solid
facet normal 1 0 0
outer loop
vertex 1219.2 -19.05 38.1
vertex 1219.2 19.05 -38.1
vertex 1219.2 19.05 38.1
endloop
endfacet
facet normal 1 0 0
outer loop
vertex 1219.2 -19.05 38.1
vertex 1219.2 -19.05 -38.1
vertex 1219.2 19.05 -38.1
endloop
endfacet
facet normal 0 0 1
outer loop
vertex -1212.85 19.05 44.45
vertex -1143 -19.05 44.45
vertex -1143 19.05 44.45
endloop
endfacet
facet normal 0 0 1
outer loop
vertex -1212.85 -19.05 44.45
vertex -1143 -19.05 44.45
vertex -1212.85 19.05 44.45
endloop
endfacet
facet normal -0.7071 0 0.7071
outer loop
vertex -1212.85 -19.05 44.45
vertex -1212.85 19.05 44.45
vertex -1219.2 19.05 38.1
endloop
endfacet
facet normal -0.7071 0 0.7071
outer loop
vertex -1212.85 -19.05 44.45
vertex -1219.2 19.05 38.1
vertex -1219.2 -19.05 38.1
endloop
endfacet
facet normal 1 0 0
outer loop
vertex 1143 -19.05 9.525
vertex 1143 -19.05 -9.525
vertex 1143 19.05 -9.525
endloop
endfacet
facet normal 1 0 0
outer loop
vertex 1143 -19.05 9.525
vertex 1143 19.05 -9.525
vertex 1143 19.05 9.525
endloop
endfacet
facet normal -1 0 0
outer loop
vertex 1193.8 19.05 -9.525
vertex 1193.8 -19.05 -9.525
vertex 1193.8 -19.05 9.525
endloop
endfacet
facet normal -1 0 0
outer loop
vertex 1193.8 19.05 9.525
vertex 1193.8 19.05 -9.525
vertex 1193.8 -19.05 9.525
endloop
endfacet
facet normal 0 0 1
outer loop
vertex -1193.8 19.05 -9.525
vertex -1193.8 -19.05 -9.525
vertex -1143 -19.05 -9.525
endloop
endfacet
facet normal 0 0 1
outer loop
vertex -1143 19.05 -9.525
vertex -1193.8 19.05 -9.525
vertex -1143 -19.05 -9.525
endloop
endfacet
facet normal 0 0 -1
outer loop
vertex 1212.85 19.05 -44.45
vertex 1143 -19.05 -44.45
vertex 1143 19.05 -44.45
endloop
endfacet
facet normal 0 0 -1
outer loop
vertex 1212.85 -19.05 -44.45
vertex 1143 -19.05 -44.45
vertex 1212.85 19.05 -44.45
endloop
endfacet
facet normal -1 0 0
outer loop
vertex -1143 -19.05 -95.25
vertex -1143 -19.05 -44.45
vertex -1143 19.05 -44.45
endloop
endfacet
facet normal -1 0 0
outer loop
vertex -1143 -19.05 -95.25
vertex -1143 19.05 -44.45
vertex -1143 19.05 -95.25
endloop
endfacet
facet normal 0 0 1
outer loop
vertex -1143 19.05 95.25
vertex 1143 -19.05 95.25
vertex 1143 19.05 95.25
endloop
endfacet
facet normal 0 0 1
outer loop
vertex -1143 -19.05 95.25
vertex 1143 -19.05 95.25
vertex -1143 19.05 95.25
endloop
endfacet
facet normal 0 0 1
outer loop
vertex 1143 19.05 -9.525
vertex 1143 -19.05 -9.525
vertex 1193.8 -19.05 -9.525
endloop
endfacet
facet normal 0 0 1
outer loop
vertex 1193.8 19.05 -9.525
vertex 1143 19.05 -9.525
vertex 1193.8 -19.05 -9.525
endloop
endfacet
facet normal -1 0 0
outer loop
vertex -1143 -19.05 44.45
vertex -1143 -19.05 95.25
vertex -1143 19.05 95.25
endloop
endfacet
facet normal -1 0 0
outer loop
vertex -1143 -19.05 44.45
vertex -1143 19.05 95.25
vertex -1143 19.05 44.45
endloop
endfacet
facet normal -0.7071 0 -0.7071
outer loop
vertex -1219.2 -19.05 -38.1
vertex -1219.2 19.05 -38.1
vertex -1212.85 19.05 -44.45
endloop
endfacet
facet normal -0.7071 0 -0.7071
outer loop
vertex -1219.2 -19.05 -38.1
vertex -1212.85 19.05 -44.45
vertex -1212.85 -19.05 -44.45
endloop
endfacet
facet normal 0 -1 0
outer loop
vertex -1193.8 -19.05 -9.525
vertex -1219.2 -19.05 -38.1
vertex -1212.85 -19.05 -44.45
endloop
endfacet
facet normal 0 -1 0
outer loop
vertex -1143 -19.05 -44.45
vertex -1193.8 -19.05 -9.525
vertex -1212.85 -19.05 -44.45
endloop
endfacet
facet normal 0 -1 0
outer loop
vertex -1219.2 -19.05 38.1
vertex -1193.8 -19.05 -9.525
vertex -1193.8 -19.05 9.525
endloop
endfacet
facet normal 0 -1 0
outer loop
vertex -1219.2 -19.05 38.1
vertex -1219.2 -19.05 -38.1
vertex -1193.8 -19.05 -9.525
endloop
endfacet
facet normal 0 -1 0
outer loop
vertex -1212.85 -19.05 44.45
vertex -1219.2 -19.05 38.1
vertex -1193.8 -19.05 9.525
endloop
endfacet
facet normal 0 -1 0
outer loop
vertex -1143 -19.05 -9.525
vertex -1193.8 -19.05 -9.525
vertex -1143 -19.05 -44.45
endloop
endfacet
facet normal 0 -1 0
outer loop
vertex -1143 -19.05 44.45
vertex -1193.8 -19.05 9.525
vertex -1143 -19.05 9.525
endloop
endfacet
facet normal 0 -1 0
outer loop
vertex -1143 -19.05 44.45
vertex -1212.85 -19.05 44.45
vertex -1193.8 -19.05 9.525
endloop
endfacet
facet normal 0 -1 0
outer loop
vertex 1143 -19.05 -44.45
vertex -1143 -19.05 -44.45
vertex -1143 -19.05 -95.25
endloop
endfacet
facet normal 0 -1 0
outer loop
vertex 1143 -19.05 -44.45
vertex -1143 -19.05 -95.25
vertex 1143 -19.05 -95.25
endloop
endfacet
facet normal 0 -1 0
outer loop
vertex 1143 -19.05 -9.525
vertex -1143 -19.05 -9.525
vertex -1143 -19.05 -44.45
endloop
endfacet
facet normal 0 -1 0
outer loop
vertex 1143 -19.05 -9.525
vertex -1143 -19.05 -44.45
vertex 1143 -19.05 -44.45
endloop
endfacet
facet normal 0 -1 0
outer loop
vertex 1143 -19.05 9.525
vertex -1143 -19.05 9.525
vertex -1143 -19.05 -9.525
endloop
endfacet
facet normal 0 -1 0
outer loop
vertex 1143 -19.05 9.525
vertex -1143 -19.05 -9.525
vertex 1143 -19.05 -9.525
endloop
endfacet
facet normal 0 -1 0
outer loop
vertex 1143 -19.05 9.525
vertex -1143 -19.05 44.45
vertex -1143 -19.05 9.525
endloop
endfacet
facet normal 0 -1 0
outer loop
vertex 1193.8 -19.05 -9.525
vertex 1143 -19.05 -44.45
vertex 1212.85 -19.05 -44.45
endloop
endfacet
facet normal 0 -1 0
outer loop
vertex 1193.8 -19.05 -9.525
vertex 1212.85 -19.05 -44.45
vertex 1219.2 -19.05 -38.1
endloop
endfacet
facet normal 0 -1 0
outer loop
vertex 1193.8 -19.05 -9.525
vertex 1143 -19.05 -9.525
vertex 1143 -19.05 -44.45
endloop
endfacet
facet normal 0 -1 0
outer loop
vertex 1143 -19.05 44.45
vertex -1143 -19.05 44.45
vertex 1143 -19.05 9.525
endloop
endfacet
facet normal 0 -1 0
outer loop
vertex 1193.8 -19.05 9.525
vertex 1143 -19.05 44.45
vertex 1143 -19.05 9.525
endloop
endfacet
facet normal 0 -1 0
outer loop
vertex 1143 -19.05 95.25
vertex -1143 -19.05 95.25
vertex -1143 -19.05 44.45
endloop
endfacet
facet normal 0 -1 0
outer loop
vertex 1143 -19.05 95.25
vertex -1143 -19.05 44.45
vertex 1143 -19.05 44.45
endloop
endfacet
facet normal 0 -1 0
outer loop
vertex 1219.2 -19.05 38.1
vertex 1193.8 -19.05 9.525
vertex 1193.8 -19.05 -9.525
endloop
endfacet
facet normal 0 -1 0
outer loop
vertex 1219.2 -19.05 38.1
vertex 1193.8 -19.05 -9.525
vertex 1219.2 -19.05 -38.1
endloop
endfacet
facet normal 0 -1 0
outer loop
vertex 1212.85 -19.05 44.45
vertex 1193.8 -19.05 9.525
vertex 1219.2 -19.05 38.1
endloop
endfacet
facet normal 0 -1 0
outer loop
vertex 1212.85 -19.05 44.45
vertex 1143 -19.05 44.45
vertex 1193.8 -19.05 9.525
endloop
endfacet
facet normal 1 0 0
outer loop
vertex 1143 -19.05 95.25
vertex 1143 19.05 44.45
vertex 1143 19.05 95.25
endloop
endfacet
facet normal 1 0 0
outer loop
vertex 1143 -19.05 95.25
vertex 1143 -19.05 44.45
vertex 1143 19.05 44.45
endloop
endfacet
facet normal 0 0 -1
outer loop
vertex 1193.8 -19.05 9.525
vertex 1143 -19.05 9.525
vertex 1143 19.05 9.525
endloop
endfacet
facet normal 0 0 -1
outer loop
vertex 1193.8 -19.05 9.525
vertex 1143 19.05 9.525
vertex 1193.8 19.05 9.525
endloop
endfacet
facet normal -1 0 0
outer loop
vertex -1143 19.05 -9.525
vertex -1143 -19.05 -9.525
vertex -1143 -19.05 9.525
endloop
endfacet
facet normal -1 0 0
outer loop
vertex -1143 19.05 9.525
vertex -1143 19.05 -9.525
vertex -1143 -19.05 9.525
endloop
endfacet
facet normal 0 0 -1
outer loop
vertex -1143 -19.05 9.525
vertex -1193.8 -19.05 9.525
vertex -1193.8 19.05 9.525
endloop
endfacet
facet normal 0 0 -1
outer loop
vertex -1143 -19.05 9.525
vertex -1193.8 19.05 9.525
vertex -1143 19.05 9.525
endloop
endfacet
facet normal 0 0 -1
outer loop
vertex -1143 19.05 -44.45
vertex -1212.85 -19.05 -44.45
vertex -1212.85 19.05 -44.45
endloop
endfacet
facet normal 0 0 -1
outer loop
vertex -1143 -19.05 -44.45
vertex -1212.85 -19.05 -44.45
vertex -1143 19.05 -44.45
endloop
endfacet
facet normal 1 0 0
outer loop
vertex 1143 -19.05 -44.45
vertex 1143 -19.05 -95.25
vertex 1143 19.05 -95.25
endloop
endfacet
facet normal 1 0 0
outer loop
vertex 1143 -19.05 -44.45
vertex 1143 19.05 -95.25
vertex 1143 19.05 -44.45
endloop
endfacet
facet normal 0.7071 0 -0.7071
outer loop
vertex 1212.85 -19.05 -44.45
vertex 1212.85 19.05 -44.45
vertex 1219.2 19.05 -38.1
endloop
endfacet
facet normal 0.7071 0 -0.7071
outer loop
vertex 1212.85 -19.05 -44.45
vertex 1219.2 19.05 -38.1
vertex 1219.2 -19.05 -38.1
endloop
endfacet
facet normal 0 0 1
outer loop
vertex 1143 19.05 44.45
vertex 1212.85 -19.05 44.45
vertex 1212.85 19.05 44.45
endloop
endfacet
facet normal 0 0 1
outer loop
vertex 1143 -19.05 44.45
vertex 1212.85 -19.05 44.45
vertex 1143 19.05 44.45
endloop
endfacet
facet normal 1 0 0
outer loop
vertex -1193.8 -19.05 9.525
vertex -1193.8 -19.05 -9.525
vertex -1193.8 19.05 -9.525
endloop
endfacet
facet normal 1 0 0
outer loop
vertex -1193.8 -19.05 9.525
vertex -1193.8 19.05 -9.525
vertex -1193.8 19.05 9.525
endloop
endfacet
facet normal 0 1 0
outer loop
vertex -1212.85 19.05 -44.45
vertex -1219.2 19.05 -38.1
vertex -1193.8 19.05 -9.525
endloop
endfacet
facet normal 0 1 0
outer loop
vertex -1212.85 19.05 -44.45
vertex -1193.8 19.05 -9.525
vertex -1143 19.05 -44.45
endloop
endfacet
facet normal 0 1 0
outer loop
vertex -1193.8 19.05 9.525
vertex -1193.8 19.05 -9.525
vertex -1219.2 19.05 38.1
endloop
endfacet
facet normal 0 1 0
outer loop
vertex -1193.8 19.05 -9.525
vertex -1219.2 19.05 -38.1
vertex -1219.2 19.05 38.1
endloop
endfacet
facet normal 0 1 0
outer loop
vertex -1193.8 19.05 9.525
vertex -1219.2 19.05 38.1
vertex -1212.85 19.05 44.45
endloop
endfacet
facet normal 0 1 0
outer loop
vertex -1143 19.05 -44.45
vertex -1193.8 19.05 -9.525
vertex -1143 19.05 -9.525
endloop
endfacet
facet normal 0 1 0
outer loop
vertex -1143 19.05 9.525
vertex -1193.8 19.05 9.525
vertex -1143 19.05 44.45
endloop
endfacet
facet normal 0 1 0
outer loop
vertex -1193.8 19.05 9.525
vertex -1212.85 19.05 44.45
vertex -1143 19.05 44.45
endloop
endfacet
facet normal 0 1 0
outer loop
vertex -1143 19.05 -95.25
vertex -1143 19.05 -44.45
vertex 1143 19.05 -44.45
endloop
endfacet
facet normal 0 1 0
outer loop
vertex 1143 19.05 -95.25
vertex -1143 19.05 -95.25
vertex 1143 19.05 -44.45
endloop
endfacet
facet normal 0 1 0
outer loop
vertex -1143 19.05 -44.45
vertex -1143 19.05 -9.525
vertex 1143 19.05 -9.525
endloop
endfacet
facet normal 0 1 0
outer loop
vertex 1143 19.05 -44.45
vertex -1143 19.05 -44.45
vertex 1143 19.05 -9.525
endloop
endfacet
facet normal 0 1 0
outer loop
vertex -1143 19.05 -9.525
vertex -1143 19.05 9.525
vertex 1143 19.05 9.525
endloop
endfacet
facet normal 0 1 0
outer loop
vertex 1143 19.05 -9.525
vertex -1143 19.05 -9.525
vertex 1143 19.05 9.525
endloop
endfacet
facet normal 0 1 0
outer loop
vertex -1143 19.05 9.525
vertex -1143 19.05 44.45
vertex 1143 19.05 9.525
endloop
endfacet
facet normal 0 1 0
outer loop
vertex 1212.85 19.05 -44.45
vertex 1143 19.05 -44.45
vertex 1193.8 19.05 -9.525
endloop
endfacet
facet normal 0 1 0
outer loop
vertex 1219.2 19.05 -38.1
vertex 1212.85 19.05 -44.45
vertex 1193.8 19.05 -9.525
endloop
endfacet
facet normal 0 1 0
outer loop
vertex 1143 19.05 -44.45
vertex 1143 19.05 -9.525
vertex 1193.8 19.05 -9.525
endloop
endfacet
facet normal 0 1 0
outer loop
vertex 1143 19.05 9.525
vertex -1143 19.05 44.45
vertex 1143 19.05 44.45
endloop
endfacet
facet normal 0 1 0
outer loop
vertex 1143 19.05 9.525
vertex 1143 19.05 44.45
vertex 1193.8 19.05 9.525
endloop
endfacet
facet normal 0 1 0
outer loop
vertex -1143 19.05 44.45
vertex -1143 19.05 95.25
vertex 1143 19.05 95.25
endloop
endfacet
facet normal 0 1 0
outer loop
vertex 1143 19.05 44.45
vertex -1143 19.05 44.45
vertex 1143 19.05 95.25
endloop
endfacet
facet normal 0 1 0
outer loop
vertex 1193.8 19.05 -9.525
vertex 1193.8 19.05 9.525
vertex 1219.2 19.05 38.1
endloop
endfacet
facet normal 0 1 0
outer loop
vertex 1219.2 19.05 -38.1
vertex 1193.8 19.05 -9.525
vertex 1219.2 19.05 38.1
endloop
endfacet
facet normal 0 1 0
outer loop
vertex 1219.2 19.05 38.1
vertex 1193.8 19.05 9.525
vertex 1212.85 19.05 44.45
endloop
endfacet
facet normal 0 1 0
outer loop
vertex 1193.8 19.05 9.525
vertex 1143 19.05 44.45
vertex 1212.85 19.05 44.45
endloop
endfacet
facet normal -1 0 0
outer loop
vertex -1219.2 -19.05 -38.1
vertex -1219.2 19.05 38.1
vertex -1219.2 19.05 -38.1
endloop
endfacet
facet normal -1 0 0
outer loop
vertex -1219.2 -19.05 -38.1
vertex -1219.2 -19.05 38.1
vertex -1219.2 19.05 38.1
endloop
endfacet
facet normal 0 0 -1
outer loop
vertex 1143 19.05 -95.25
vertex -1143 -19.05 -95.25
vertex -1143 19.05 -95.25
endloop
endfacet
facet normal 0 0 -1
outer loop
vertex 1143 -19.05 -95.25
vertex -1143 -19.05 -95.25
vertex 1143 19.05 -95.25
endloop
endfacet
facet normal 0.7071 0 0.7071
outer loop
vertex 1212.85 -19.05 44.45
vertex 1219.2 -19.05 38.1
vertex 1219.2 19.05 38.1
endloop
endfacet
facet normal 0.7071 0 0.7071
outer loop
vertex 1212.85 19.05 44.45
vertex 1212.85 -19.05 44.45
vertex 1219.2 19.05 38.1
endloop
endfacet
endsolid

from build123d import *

# Parameters (mm, degrees)
F1_DEPTH      = 19.05
F1_DEPTH_BACK = 19.05
F2_SIZE       = 6.35
F3_W          = 50.8
F3_H          = 19.05
F4_DEPTH      = 38.101


with BuildPart() as f1:
    # F0 (on Front) → F1 (new body, two sides)
    with BuildSketch(Plane.XZ) as f1_sk:
        Polygon((1143, 95.25), (-1143, 95.25), (-1143, 44.45), (-1219.2, 44.45), (-1219.2, -44.45), (-1143, -44.45), (-1143, -95.25), (1143, -95.25), (1143, -44.45), (1219.2, -44.45), (1219.2, 44.45), (1143, 44.45), align=None)
    extrude(amount=F1_DEPTH)
    extrude(f1_sk.sketch, amount=-F1_DEPTH_BACK)

    # F2
    f2_edges = [f1.edges().sort_by_distance(p)[0] for p in [
        (1219.2, 0, 44.45),
        (1219.2, 0, -44.45),
        (-1219.2, 0, 44.45),
        (-1219.2, 0, -44.45),
    ]]
    chamfer(f2_edges, length=F2_SIZE)

    # F3 (on face) → F4 (cut, through all)
    with BuildSketch(Plane.XZ.offset(19.05)):
        with Locations((1168.4, 0)):
            Rectangle(F3_W, F3_H)
        with Locations((-1168.4, 0)):
            Rectangle(F3_W, F3_H)
    extrude(amount=-F4_DEPTH, mode=Mode.SUBTRACT)


solid = f1.part
